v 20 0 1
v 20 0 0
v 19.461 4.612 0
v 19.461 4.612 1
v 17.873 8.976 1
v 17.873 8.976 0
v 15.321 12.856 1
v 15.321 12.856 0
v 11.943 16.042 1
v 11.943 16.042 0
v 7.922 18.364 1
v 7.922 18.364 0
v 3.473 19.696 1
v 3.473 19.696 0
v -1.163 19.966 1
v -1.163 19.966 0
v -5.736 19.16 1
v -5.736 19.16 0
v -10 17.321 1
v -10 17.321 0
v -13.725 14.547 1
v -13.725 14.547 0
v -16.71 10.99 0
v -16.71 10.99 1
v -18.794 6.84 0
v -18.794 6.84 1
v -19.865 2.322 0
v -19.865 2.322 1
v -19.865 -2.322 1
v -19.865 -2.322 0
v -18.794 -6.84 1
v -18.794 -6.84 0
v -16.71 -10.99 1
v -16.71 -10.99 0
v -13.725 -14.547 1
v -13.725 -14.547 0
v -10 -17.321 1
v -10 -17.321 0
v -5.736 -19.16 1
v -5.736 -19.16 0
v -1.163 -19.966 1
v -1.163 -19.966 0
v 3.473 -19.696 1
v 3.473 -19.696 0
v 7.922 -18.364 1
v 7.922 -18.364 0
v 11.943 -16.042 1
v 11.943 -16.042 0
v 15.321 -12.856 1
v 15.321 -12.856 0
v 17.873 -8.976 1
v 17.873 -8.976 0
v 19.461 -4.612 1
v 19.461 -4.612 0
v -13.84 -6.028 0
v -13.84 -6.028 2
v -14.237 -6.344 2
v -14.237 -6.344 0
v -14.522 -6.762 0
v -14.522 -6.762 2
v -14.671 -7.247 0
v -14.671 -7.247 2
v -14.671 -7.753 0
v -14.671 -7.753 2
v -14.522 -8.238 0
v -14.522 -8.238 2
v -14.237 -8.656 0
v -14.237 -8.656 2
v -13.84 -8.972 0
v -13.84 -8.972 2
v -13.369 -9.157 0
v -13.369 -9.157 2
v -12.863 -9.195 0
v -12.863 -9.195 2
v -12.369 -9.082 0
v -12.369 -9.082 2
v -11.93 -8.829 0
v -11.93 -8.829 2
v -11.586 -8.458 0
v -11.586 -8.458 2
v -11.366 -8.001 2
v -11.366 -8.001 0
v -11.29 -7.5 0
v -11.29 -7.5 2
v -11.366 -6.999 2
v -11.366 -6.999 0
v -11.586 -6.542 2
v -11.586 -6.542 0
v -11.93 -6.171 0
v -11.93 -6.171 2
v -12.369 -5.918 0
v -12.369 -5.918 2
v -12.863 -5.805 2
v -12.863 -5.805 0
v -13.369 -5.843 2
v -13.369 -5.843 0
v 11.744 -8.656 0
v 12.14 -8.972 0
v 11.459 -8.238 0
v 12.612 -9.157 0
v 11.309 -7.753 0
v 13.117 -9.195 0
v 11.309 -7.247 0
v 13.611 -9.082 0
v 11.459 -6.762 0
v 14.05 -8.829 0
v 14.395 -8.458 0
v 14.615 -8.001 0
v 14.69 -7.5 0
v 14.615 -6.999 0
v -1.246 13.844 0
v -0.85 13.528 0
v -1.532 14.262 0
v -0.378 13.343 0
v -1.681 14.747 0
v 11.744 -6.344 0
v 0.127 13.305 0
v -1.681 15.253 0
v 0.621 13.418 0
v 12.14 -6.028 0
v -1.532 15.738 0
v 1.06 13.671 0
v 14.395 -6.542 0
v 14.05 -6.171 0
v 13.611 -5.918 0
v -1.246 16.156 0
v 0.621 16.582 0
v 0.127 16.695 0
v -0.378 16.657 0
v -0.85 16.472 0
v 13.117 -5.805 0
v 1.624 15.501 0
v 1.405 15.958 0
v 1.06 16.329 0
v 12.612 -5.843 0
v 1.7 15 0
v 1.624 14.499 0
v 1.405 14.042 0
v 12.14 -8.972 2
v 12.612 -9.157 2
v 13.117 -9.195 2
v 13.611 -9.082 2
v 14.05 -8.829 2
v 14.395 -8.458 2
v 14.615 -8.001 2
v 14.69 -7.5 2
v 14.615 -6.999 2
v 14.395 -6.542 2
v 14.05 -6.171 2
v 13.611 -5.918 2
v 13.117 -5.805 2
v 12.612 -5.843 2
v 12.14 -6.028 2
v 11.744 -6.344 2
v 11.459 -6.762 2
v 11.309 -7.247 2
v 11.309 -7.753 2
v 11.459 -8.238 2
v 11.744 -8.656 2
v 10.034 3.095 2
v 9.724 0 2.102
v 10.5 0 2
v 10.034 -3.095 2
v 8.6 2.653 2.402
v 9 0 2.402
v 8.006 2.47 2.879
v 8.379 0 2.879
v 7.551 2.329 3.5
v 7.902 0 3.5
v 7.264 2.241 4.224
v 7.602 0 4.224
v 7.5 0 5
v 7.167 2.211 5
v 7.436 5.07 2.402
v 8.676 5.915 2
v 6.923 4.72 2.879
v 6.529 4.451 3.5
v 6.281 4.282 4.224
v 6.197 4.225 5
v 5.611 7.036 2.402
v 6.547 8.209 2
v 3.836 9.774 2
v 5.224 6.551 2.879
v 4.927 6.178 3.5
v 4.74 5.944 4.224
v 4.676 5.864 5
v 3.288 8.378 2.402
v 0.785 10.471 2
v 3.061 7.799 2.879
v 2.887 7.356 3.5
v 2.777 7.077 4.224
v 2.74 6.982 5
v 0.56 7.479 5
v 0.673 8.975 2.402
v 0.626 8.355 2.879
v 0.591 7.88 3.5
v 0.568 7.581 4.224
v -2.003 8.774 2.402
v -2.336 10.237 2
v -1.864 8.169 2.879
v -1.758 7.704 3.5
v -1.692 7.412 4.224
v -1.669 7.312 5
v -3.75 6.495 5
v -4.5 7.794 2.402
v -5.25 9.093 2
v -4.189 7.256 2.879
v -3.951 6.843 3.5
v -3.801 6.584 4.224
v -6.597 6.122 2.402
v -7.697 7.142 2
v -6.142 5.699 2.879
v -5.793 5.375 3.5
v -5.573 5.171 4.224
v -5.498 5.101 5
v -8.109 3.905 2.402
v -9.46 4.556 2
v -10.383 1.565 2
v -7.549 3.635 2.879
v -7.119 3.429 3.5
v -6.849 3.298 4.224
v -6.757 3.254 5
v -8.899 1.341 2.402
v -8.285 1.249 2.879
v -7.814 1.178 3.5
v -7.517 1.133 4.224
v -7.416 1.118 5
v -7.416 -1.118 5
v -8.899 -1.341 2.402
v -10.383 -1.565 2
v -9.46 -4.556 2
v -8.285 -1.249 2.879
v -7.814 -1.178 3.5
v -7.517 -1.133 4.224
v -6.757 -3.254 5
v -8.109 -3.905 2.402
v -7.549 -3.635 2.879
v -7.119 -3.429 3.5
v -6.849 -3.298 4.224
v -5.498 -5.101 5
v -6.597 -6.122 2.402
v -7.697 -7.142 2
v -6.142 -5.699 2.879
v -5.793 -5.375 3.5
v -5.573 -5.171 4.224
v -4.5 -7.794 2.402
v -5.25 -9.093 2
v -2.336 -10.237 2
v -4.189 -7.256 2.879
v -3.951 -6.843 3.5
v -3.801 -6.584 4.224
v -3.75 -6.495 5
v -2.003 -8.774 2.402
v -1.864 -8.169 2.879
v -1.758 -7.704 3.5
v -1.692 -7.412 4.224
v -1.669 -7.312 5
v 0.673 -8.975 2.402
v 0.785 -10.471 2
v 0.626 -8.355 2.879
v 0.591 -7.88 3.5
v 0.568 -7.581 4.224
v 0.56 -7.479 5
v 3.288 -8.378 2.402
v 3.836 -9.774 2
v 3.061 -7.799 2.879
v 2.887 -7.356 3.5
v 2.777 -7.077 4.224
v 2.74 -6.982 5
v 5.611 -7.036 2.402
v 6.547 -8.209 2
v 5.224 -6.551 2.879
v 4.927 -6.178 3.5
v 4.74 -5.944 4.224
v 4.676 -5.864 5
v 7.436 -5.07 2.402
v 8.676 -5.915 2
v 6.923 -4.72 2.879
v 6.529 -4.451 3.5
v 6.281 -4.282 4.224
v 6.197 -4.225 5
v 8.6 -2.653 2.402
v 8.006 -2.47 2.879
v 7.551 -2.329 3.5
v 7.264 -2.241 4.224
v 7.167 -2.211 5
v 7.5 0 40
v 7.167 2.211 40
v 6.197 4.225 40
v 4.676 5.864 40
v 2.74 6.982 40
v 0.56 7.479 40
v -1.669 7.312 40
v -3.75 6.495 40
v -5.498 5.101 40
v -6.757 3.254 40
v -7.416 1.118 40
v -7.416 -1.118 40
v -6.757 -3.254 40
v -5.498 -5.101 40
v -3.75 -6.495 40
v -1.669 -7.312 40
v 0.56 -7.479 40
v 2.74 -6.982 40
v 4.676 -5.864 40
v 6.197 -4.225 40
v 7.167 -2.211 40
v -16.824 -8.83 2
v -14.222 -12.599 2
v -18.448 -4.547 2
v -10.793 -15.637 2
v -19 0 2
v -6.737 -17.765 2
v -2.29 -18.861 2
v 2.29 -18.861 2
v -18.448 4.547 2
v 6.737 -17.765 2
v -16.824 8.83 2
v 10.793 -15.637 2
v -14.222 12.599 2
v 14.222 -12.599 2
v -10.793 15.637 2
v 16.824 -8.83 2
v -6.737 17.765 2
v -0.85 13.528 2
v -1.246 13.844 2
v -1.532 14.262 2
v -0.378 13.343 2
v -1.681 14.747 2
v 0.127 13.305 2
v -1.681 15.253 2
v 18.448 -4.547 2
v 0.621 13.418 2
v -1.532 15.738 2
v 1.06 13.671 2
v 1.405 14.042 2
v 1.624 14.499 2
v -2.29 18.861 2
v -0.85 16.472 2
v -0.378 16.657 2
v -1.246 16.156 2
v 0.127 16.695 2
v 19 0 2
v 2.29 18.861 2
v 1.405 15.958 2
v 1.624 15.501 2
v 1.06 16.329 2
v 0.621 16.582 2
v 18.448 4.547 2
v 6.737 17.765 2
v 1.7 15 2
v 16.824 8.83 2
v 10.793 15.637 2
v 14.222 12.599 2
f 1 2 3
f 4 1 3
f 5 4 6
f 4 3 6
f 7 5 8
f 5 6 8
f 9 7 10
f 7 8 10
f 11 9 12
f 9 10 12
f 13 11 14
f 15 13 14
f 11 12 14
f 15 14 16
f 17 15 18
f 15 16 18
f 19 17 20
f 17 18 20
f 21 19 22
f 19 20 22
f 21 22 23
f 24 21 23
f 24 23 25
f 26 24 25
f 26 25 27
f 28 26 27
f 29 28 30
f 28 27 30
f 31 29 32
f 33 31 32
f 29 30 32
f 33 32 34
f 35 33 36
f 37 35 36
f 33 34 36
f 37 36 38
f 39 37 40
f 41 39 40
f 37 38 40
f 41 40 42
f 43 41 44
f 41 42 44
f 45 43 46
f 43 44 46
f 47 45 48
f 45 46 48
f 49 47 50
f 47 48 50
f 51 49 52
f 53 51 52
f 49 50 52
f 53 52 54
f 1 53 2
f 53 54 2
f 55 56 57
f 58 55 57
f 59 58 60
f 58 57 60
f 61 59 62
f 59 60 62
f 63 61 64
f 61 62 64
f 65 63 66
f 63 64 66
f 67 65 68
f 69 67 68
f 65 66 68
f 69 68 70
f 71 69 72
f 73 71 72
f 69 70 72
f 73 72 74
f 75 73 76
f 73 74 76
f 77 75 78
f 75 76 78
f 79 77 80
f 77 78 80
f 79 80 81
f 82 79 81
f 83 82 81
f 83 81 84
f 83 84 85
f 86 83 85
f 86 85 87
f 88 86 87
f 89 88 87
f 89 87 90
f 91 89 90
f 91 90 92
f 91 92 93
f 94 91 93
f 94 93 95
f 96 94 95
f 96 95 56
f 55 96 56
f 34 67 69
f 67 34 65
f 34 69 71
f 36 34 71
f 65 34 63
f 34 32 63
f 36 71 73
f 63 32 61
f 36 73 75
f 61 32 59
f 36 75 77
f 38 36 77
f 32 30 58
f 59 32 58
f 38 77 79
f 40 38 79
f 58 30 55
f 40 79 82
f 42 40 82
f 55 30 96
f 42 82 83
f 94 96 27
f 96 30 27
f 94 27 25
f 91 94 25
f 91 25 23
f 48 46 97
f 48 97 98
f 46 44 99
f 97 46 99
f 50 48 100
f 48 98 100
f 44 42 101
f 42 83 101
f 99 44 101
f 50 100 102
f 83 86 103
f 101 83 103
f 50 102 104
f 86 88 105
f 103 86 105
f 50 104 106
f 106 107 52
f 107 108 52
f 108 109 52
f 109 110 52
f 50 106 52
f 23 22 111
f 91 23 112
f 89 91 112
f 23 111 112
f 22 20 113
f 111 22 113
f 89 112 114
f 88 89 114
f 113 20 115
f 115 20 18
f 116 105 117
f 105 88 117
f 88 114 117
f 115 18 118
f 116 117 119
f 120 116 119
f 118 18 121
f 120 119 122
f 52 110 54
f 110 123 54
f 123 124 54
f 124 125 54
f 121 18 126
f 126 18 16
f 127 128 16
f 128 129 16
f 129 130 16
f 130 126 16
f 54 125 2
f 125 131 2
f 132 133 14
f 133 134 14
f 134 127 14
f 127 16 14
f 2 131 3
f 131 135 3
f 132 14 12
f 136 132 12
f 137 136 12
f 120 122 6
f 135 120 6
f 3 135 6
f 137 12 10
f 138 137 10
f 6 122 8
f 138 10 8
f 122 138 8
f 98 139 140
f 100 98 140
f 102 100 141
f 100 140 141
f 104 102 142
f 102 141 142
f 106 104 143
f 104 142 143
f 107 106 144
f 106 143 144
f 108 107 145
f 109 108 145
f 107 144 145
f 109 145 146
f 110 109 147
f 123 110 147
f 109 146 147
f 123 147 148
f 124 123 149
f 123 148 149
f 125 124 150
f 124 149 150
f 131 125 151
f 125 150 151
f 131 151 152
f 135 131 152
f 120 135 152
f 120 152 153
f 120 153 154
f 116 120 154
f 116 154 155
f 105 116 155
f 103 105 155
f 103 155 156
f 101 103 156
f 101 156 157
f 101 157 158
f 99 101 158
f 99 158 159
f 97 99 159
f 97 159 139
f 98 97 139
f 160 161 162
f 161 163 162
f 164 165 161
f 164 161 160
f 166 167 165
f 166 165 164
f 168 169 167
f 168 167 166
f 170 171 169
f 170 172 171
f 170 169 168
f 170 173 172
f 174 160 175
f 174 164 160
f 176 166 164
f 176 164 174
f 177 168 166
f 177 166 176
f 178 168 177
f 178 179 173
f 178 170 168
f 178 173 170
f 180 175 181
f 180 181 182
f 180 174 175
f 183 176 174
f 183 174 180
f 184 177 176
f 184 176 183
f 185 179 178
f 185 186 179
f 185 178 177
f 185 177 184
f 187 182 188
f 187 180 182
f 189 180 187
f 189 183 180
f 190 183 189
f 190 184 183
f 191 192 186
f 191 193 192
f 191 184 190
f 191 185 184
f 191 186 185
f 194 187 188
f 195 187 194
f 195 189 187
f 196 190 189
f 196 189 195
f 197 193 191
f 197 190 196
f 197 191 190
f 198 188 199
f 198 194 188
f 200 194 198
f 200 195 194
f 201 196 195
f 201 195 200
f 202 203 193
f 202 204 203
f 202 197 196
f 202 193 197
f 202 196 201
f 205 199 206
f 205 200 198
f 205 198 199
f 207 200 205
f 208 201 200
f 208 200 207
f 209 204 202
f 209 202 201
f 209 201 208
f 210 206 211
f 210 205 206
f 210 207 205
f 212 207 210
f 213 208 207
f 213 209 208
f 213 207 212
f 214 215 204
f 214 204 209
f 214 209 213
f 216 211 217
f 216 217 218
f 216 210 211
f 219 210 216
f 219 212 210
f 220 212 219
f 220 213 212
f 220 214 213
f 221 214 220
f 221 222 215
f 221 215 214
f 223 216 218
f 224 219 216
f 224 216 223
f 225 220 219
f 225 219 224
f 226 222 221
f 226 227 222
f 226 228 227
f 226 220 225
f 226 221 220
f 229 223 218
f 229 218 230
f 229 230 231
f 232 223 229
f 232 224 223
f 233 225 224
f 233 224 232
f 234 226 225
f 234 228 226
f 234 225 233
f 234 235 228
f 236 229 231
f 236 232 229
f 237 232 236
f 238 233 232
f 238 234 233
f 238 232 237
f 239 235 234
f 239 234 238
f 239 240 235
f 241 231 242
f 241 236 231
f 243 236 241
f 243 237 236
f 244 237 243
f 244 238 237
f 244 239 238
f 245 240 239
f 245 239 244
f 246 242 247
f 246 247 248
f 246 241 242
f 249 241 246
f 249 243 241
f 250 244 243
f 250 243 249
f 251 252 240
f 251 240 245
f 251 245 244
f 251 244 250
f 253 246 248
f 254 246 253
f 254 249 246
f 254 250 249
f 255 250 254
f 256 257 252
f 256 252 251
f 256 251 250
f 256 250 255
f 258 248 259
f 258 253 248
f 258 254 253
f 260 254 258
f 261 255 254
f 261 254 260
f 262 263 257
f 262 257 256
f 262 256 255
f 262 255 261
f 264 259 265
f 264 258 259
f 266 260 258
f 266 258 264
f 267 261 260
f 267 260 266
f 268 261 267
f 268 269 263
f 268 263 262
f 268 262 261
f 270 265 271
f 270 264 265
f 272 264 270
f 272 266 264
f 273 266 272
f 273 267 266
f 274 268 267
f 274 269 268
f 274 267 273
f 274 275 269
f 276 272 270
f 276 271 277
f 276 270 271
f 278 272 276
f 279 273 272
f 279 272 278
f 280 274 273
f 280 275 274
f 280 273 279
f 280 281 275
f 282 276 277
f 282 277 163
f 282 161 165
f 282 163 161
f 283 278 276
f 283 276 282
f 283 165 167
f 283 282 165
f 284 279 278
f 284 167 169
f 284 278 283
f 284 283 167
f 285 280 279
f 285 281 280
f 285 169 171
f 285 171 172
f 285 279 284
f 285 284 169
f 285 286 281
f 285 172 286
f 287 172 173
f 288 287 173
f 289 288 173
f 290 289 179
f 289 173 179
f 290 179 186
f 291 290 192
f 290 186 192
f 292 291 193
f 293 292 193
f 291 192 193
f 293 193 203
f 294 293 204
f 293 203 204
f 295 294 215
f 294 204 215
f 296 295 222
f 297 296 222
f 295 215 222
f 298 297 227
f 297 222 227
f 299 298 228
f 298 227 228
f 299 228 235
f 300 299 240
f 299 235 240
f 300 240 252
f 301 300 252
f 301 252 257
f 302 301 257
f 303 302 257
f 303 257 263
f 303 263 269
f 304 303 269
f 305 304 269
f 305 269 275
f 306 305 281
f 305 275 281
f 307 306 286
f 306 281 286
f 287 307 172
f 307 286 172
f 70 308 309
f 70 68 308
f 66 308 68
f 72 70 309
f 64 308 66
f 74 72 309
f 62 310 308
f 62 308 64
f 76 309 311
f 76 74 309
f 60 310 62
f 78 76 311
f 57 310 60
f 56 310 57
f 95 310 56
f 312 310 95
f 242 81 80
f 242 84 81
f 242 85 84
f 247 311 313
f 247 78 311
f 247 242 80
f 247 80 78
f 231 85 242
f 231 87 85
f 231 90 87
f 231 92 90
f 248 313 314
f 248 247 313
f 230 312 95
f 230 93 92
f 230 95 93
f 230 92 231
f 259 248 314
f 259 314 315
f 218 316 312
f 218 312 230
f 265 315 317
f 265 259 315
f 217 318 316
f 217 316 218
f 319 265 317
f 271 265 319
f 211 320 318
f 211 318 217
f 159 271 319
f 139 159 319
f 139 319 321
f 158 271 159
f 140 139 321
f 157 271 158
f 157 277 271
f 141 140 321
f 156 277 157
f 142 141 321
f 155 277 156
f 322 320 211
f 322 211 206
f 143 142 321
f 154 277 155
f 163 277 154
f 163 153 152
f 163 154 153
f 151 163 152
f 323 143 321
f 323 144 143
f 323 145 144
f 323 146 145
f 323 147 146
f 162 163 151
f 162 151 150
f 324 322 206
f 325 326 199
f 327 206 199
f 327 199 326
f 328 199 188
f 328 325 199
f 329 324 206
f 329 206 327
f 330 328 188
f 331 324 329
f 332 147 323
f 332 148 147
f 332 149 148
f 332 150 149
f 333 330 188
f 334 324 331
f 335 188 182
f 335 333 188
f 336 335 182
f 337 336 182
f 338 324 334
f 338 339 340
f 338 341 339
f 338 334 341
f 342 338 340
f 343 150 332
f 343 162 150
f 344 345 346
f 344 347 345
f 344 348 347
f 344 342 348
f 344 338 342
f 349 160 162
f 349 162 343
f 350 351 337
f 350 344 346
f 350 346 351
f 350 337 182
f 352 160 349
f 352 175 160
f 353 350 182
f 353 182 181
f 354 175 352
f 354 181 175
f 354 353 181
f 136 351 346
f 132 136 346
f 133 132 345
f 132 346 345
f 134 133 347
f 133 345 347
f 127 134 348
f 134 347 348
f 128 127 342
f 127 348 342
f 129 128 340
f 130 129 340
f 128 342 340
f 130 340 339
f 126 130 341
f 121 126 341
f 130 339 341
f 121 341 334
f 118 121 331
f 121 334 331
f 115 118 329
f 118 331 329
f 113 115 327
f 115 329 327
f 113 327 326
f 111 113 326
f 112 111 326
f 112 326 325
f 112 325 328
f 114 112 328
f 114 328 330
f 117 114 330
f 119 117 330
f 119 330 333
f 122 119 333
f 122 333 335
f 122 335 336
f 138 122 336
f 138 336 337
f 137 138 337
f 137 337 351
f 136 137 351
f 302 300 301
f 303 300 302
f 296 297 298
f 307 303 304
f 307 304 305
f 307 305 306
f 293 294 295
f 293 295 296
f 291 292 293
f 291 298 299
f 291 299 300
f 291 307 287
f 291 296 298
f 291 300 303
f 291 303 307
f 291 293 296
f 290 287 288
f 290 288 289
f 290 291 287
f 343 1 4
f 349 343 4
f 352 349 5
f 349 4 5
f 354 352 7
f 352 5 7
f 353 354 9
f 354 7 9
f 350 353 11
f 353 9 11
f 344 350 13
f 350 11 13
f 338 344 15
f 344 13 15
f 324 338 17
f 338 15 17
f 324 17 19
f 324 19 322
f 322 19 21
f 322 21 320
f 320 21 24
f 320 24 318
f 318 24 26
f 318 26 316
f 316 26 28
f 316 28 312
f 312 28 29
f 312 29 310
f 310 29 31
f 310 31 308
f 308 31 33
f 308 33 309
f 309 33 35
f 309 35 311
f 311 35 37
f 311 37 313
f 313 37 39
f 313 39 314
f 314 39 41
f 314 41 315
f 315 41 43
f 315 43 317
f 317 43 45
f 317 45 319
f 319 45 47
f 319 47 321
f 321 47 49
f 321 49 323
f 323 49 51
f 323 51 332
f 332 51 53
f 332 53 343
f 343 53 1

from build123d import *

# Parameters (mm, degrees)
SKETCH_R           = 20
PAD_DEPTH          = 2
SKETCH001_R        = 7.5
PAD001_DEPTH       = 38
SKETCH002_R        = 1.7
HOLE_DEPTH         = 140.565065
POLARPATTERN_COUNT = 3
FILLET_R           = 3
CHAMFER_SIZE       = 1


with BuildPart() as part:
    # Sketch → Pad (new body)
    with BuildSketch(Plane.XY):
        Circle(SKETCH_R)
    extrude(amount=PAD_DEPTH)

    # Sketch001 (on Face3 of Pad) → Pad001 (join)
    with BuildSketch(Plane.XY.offset(2)):
        Circle(SKETCH001_R)
    extrude(amount=PAD001_DEPTH)

    # Sketch002 (on Face3 of Pad001) → Hole (cut, through all)
    with BuildSketch(Plane.XY.offset(2)):
        with Locations((0, 15)):
            Circle(SKETCH002_R)
    hole = extrude(amount=-HOLE_DEPTH, mode=Mode.SUBTRACT)

    # PolarPattern: Hole ×3 about axis
    polarpattern_axis = Axis((0, 0, 2), (0, 0, 1))
    for i in range(1, POLARPATTERN_COUNT):
        add(hole.rotate(polarpattern_axis, i * 360 / POLARPATTERN_COUNT), mode=Mode.SUBTRACT)

    # Fillet
    fillet_edges = [part.edges().sort_by_distance(p)[0] for p in [
        (-7.5, 0, 2),
    ]]
    fillet(fillet_edges, radius=FILLET_R)

    # Chamfer
    chamfer_edges = [part.edges().sort_by_distance(p)[0] for p in [
        (-20, 0, 2),
    ]]
    chamfer(chamfer_edges, length=CHAMFER_SIZE)


solid = part.part
